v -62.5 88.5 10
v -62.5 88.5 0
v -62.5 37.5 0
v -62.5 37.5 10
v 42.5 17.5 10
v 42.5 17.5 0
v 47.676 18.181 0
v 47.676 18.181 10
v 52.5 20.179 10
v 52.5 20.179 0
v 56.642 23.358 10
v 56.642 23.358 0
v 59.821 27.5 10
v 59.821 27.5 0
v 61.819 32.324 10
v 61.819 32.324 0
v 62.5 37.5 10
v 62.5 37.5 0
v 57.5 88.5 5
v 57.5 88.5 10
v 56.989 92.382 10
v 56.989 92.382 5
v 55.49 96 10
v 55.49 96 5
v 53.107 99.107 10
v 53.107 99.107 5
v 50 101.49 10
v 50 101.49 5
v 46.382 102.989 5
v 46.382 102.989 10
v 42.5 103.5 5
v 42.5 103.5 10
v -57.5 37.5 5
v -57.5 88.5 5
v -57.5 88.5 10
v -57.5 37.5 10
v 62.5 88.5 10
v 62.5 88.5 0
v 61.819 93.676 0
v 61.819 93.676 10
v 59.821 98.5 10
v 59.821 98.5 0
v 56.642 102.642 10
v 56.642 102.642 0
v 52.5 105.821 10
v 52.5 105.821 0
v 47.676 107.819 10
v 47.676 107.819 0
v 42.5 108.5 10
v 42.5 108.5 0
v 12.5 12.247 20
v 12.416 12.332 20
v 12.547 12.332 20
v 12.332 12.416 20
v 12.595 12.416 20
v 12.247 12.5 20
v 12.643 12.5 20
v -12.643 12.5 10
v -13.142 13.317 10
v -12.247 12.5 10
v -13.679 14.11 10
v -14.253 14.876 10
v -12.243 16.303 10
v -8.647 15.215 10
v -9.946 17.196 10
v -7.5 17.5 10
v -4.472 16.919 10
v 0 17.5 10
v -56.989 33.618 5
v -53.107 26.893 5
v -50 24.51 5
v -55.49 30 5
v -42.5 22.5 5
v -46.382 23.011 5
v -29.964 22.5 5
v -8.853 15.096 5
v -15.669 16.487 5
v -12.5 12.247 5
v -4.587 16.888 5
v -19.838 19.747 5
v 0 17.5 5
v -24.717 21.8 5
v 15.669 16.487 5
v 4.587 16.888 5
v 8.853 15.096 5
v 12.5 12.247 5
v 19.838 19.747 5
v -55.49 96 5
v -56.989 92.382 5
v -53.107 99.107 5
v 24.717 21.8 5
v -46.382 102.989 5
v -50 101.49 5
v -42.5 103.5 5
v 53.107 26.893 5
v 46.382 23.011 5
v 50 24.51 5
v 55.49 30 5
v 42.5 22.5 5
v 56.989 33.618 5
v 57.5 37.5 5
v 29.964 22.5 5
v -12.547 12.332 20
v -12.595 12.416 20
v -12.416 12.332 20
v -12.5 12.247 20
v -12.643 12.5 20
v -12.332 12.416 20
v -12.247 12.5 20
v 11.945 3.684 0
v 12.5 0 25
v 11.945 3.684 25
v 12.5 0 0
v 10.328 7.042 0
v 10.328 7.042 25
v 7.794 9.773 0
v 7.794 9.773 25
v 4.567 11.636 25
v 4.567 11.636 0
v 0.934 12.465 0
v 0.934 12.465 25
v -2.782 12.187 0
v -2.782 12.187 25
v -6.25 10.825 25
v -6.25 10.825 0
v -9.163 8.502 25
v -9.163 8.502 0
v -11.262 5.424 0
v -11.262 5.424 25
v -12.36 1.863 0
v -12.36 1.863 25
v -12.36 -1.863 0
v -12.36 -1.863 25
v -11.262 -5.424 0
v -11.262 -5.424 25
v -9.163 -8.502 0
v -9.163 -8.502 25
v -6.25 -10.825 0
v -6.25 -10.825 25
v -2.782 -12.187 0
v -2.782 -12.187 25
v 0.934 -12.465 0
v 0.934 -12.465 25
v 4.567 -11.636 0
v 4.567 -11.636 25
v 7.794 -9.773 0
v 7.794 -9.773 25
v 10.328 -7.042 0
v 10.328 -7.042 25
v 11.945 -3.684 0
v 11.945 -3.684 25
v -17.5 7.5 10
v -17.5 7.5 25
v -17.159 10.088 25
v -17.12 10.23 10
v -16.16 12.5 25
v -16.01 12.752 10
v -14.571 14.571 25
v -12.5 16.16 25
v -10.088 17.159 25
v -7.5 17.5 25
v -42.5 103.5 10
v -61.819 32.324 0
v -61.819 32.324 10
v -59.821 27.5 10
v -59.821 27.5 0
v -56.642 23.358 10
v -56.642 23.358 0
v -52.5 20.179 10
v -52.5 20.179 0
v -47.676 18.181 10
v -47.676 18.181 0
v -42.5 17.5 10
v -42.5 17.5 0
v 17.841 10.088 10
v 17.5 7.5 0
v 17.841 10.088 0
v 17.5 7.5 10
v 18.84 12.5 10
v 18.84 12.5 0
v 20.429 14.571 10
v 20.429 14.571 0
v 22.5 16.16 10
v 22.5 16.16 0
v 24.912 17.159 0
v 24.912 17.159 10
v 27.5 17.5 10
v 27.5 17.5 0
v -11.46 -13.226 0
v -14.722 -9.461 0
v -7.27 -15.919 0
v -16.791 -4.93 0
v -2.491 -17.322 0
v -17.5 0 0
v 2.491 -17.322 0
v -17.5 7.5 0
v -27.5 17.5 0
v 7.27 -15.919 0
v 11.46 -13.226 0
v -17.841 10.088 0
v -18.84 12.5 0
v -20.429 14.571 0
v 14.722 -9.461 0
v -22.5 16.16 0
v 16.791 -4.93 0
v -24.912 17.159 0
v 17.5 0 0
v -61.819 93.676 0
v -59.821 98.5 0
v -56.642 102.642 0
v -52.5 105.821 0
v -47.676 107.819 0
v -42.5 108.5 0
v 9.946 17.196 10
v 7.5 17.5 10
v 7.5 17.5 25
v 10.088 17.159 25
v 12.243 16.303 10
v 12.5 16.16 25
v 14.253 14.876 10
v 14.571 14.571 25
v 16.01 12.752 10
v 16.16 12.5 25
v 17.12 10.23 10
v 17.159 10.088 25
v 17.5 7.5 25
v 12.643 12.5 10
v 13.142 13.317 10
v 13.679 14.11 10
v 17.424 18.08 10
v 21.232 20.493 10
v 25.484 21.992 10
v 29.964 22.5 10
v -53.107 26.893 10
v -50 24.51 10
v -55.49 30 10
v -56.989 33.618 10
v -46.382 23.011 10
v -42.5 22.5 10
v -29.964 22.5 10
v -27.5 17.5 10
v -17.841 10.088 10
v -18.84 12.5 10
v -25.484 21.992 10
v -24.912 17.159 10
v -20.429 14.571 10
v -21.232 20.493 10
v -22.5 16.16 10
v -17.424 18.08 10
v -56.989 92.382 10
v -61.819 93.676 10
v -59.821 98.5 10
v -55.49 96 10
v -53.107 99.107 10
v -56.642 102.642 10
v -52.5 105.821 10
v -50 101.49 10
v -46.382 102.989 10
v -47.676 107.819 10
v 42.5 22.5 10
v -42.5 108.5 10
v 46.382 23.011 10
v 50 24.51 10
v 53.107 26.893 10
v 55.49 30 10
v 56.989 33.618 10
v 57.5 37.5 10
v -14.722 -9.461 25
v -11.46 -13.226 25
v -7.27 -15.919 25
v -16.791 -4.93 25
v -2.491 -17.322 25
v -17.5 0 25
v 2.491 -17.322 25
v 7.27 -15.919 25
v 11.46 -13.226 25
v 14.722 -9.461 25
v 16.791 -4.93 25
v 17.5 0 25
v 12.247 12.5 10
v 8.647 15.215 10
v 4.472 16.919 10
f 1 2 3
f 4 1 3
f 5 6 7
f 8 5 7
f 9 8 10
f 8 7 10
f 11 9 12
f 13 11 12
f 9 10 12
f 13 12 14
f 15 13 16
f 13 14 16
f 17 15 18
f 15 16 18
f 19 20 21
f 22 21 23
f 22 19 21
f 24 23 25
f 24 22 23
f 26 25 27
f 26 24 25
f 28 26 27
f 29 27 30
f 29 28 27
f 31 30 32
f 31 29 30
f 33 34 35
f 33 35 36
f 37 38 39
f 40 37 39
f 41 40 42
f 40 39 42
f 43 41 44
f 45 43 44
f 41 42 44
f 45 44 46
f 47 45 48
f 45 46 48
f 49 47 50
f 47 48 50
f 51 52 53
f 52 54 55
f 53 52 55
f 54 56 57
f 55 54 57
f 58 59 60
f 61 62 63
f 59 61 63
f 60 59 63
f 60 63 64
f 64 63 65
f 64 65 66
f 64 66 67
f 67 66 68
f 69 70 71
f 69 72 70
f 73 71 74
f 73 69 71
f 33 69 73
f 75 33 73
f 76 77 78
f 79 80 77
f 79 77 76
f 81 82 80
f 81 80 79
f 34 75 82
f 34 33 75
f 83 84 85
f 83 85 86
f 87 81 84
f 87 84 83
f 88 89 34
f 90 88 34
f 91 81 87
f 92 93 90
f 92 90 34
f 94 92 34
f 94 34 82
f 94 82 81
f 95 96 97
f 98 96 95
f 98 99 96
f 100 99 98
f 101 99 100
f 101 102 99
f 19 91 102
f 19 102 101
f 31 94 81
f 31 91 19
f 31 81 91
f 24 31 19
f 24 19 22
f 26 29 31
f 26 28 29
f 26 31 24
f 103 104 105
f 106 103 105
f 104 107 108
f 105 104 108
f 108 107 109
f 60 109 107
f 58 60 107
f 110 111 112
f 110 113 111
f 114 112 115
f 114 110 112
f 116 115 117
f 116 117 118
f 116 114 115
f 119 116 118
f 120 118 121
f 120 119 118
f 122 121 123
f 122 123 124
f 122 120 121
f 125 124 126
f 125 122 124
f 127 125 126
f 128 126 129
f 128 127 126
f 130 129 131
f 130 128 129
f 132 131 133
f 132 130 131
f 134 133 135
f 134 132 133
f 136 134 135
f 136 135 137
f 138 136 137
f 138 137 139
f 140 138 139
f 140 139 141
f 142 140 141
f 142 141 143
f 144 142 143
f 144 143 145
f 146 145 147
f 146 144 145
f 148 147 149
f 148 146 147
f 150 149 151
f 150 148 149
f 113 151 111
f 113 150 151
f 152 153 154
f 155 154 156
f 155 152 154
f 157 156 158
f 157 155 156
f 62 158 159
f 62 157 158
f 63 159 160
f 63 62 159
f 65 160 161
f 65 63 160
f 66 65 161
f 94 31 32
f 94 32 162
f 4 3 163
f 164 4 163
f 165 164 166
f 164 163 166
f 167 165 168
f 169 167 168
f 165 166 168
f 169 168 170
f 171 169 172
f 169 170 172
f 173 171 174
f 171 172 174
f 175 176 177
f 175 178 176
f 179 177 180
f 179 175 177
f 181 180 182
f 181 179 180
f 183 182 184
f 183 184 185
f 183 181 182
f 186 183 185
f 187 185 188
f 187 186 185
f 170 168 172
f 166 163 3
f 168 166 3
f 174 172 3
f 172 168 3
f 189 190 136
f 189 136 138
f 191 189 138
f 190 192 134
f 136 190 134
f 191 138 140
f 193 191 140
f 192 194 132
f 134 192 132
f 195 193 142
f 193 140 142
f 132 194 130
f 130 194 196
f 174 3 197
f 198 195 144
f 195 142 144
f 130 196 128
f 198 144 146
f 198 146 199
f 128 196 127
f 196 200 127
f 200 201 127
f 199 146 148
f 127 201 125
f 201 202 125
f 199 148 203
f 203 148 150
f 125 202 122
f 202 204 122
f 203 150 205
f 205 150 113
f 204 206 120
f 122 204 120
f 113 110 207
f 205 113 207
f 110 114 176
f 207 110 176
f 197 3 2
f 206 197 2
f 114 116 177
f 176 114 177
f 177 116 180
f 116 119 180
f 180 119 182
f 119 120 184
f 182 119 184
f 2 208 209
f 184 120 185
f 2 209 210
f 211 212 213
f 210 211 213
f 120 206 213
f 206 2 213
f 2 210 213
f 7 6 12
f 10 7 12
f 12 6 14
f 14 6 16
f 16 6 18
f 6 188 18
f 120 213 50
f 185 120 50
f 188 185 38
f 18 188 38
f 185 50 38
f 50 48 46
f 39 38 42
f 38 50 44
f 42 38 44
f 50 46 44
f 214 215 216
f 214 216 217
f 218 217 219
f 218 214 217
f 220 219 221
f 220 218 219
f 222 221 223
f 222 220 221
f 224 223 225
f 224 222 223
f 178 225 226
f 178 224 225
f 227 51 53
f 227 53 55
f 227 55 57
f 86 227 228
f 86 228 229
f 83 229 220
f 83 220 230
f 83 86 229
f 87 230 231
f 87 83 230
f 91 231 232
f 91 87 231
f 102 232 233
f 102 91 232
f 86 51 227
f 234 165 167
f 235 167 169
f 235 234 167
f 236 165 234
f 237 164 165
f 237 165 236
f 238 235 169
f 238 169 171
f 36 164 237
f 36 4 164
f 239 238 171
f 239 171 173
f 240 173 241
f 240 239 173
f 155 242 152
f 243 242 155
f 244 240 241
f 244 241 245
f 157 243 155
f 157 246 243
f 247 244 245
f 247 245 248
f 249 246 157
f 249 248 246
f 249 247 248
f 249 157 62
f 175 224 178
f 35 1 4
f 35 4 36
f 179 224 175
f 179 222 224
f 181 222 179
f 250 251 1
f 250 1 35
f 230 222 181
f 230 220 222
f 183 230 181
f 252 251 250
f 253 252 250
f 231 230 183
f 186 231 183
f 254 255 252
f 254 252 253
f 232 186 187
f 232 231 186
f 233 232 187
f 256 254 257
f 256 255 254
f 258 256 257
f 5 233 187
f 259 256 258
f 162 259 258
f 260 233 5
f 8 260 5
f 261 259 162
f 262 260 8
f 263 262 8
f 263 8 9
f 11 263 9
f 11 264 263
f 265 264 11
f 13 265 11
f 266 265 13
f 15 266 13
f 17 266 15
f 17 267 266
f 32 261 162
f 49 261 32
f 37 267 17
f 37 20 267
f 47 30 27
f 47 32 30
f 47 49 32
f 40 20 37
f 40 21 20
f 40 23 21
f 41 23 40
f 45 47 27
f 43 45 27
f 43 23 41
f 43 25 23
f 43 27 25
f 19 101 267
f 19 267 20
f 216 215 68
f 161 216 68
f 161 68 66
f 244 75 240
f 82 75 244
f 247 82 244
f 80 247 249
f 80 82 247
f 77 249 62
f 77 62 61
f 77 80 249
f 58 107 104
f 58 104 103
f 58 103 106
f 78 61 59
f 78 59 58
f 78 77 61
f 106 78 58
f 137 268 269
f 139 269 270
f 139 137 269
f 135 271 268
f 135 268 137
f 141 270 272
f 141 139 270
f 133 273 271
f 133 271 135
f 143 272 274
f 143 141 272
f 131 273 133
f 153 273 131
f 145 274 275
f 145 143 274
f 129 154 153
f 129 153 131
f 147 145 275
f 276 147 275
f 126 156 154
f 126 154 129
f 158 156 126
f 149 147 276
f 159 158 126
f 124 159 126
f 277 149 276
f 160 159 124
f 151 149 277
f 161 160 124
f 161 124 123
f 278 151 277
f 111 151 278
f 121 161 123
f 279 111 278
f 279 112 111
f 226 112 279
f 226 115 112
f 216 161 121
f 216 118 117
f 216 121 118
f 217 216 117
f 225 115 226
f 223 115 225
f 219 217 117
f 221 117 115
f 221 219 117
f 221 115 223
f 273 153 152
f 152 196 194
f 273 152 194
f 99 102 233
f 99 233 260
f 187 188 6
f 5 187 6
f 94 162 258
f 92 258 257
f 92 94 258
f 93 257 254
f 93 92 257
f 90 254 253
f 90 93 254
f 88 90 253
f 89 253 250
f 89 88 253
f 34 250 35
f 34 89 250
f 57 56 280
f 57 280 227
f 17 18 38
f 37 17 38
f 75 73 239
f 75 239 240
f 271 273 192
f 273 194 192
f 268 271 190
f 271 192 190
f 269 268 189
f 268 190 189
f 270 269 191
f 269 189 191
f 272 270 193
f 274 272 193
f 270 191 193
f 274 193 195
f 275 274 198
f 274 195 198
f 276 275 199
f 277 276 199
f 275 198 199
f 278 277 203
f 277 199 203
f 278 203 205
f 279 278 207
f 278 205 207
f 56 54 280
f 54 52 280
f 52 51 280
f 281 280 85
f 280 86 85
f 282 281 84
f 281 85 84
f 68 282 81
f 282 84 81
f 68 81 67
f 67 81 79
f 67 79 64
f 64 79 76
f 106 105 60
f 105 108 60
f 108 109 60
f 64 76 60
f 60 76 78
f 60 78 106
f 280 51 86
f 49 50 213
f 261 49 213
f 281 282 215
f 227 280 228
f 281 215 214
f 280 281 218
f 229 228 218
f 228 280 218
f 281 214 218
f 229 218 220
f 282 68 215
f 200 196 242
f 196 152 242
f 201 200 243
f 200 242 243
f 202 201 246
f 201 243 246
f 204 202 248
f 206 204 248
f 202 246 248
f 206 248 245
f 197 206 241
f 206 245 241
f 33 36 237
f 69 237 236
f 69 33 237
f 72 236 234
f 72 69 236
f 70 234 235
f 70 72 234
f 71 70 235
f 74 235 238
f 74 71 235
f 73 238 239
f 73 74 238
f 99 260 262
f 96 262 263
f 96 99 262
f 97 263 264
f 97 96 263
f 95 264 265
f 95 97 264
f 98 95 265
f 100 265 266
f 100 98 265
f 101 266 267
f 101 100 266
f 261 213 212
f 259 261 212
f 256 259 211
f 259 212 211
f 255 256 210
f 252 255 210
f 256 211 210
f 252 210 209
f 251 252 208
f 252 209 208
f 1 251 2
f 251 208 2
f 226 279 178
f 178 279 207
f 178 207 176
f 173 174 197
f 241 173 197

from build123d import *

# Parameters (mm, degrees)
F0_R         = 12.5
F1_DEPTH     = 10
F2_R         = 12.5
F3_DEPTH     = 15
F4_T         = 5
F4_T3_DEPTH  = 20
F5_R         = 10
F6_T1_DEPTH  = 40
F7_T1_DEPTH  = 5
F7_T6_DEPTH  = 92.3194198861
F7_T13_DEPTH = 48.659709943


# Not quite as in the source:
# - a fillet or chamfer that OpenCascade refuses, or shapes differently, is made with other operations: its cross-section is extruded or revolved along the edge and cut away or added
# - a shell that OpenCascade refuses in one call is made with other operations: the cavity is built on its own and cut out


with BuildPart() as f1:
    # F0 (on Top) → F1 (new body)
    with BuildSketch(Plane.XY):
        with BuildLine():
            Line((17.5, 0), (17.5, 17.5))
            Line((17.5, 17.5), (0, 17.5))
            ThreePointArc((0, 17.5), (12.3743686708, 12.3743686708), (17.5, 0))
        make_face()
        with BuildLine():
            Line((0, 17.5), (-17.5, 17.5))
            Line((-17.5, 17.5), (-17.5, 0))
            ThreePointArc((-17.5, 0), (-12.3743686708, 12.3743686708), (0, 17.5))
        make_face()
        with BuildLine():
            ThreePointArc((17.5, 0), (12.3743686708, 12.3743686708), (0, 17.5))
            ThreePointArc((0, 17.5), (-12.3743686708, 12.3743686708), (-17.5, 0))
            ThreePointArc((-17.5, 0), (0, -17.5), (17.5, 0))
        make_face()
        Circle(F0_R, mode=Mode.SUBTRACT)
        with BuildLine():
            Line((42.5, 108.5), (0, 108.5))
            Line((0, 108.5), (-42.5, 108.5))
            ThreePointArc((-42.5, 108.5), (-56.6421356237, 102.6421356237), (-62.5, 88.5))
            Line((-62.5, 88.5), (-62.5, 37.5))
            ThreePointArc((-62.5, 37.5), (-56.6421356237, 23.3578643763), (-42.5, 17.5))
            Line((-42.5, 17.5), (-17.5, 17.5))
            Line((-17.5, 17.5), (0, 17.5))
            Line((0, 17.5), (17.5, 17.5))
            Line((17.5, 17.5), (42.5, 17.5))
            ThreePointArc((42.5, 17.5), (56.6421356237, 23.3578643763), (62.5, 37.5))
            Line((62.5, 37.5), (62.5, 88.5))
            ThreePointArc((62.5, 88.5), (56.6421356237, 102.6421356237), (42.5, 108.5))
        make_face()
    extrude(amount=F1_DEPTH)

    # F2 (on face) → F3 (join)
    with BuildSketch(Plane.XY.offset(10)):
        with BuildLine():
            Line((17.5, 17.5), (-17.5, 17.5))
            Line((-17.5, 17.5), (-17.5, 0))
            ThreePointArc((-17.5, 0), (0, -17.5), (17.5, 0))
            Line((17.5, 0), (17.5, 17.5))
        make_face()
        Circle(F2_R, mode=Mode.SUBTRACT)
    extrude(amount=F3_DEPTH)

    # F4: shell of thickness 5, made by hand


with BuildPart() as f4_core1:
    # F4_t2: copy of F1
    add(f1.part)

    # the walls: a layer under each face that stays
    f4_faces = [f4_core1.faces().sort_by_distance(p)[0] for p in [
        (0, -17.5, 12.5),
        (0, 45.5, 0),
        (-12.5, 0, 12.5),
        (-30, 17.5, 5),
        (0, 17.5, 17.5),
        (-56.6421356237, 23.3578643763, 5),
        (-62.5, 63, 5),
        (-56.6421356237, 102.6421356237, 5),
        (0, 108.5, 5),
        (56.6421356237, 102.6421356237, 5),
        (62.5, 63, 5),
        (56.6421356237, 23.3578643763, 5),
        (30, 17.5, 5),
        (17.5, 8.75, 12.5),
        (-11.6666666667, -11.6666666667, 25),
        (-17.5, 8.75, 12.5),
    ]]
    thicken(f4_faces, amount=-F4_T, mode=Mode.SUBTRACT)

    # F4_s4 → F4_t3 (cut)
    with BuildSketch(Plane.XY.offset(-5)):
        Polygon((-17.55, 17.45), (-17.5, 22.5), (-12.5, 22.5), (-12.5, 17.5), align=None)
        Polygon((17.55, 17.45), (17.5, 22.5), (12.5, 22.5), (12.5, 17.5), align=None)
    extrude(amount=F4_T3_DEPTH, mode=Mode.SUBTRACT)


with BuildPart() as f1_1:
    add(f1.part)

    # what is left inside the walls is the cavity
    f4_cavity = [f4_core1.part.solids().sort_by_distance(p)[0] for p in [
        (0, 42.664966, 5.05),
    ]]
    add(f4_cavity, mode=Mode.SUBTRACT)

    # F5
    f5_edges = [f1_1.edges().sort_by_distance(p)[0] for p in [
        (17.5, 17.5, 5),
        (-17.5, 17.5, 5),
    ]]
    fillet(f5_edges, radius=F5_R)

    # F6: fillet of radius 10 on 2 edges, made by hand

    # F6_s2 → F6_t1 (cut)
    with BuildSketch(Plane.XY.offset(10)):
        with BuildLine():
            ThreePointArc((7.5, 17.5), (14.5710678119, 14.5710678119), (17.5, 7.5))
            Line((17.5, 7.5), (17.5, 17.5))
            Line((17.5, 17.5), (7.5, 17.5))
        make_face()
        with BuildLine():
            ThreePointArc((-17.5, 7.5), (-14.5710678119, 14.5710678119), (-7.5, 17.5))
            Line((-7.5, 17.5), (-17.5, 17.5))
            Line((-17.5, 17.5), (-17.5, 7.5))
        make_face()
    extrude(amount=F6_T1_DEPTH, mode=Mode.SUBTRACT)

    # F7: fillet of radius 20 on 2 edges, made by hand

    # F7_s2 → F7_t1 (cut)
    with BuildSketch(Plane.XY.offset(5)):
        with BuildLine():
            ThreePointArc((12.5, 12.2474487139), (19.8383956996, 19.7474487139), (29.9638839772, 22.5))
            Line((29.9638839772, 22.5), (12.5, 22.5))
            Line((12.5, 22.5), (12.5, 12.2474487139))
        make_face()
        with BuildLine():
            ThreePointArc((-29.9638839772, 22.5), (-19.8383956996, 19.7474487139), (-12.5, 12.2474487139))
            Line((-12.5, 12.2474487139), (-12.5, 22.5))
            Line((-12.5, 22.5), (-29.9638839772, 22.5))
        make_face()
    extrude(amount=F7_T1_DEPTH, mode=Mode.SUBTRACT)


with BuildPart() as f7_tool4:
    # F7_s5 → F7_t6 (new body)
    with BuildSketch(Plane.XY.offset(-38.659709943)):
        with BuildLine():
            ThreePointArc((12.5, 12.2474487139), (19.8383956996, 19.7474487139), (29.9638839772, 22.5))
            Line((29.9638839772, 22.5), (12.5, 22.5))
            Line((12.5, 22.5), (12.5, 12.2474487139))
        make_face()
    extrude(amount=F7_T6_DEPTH)

    split(bisect_by=Plane.XZ.offset(-12.5), keep=Keep.TOP)

    split(bisect_by=Plane.XY.offset(20), keep=Keep.BOTTOM)

    split(bisect_by=Plane.XY.offset(10), keep=Keep.TOP)


with BuildPart() as f1_2:
    add(f1_1.part)

    # F7_t3: cut F7_tool4
    add(f7_tool4.part, mode=Mode.SUBTRACT)


with BuildPart() as f7_tool11:
    # F7_s12 → F7_t13 (new body)
    with BuildSketch(Plane.XY.offset(5)):
        with BuildLine():
            ThreePointArc((-29.9638839772, 22.5), (-19.8383956996, 19.7474487139), (-12.5, 12.2474487139))
            Line((-12.5, 12.2474487139), (-12.5, 22.5))
            Line((-12.5, 22.5), (-29.9638839772, 22.5))
        make_face()
    extrude(amount=F7_T13_DEPTH)

    split(bisect_by=Plane.XZ.offset(-12.5), keep=Keep.TOP)

    split(bisect_by=Plane.XY.offset(20), keep=Keep.BOTTOM)


with BuildPart() as f1_3:
    add(f1_2.part)

    # F7_t10: cut F7_tool11
    add(f7_tool11.part, mode=Mode.SUBTRACT)


solid = f1_3.part
